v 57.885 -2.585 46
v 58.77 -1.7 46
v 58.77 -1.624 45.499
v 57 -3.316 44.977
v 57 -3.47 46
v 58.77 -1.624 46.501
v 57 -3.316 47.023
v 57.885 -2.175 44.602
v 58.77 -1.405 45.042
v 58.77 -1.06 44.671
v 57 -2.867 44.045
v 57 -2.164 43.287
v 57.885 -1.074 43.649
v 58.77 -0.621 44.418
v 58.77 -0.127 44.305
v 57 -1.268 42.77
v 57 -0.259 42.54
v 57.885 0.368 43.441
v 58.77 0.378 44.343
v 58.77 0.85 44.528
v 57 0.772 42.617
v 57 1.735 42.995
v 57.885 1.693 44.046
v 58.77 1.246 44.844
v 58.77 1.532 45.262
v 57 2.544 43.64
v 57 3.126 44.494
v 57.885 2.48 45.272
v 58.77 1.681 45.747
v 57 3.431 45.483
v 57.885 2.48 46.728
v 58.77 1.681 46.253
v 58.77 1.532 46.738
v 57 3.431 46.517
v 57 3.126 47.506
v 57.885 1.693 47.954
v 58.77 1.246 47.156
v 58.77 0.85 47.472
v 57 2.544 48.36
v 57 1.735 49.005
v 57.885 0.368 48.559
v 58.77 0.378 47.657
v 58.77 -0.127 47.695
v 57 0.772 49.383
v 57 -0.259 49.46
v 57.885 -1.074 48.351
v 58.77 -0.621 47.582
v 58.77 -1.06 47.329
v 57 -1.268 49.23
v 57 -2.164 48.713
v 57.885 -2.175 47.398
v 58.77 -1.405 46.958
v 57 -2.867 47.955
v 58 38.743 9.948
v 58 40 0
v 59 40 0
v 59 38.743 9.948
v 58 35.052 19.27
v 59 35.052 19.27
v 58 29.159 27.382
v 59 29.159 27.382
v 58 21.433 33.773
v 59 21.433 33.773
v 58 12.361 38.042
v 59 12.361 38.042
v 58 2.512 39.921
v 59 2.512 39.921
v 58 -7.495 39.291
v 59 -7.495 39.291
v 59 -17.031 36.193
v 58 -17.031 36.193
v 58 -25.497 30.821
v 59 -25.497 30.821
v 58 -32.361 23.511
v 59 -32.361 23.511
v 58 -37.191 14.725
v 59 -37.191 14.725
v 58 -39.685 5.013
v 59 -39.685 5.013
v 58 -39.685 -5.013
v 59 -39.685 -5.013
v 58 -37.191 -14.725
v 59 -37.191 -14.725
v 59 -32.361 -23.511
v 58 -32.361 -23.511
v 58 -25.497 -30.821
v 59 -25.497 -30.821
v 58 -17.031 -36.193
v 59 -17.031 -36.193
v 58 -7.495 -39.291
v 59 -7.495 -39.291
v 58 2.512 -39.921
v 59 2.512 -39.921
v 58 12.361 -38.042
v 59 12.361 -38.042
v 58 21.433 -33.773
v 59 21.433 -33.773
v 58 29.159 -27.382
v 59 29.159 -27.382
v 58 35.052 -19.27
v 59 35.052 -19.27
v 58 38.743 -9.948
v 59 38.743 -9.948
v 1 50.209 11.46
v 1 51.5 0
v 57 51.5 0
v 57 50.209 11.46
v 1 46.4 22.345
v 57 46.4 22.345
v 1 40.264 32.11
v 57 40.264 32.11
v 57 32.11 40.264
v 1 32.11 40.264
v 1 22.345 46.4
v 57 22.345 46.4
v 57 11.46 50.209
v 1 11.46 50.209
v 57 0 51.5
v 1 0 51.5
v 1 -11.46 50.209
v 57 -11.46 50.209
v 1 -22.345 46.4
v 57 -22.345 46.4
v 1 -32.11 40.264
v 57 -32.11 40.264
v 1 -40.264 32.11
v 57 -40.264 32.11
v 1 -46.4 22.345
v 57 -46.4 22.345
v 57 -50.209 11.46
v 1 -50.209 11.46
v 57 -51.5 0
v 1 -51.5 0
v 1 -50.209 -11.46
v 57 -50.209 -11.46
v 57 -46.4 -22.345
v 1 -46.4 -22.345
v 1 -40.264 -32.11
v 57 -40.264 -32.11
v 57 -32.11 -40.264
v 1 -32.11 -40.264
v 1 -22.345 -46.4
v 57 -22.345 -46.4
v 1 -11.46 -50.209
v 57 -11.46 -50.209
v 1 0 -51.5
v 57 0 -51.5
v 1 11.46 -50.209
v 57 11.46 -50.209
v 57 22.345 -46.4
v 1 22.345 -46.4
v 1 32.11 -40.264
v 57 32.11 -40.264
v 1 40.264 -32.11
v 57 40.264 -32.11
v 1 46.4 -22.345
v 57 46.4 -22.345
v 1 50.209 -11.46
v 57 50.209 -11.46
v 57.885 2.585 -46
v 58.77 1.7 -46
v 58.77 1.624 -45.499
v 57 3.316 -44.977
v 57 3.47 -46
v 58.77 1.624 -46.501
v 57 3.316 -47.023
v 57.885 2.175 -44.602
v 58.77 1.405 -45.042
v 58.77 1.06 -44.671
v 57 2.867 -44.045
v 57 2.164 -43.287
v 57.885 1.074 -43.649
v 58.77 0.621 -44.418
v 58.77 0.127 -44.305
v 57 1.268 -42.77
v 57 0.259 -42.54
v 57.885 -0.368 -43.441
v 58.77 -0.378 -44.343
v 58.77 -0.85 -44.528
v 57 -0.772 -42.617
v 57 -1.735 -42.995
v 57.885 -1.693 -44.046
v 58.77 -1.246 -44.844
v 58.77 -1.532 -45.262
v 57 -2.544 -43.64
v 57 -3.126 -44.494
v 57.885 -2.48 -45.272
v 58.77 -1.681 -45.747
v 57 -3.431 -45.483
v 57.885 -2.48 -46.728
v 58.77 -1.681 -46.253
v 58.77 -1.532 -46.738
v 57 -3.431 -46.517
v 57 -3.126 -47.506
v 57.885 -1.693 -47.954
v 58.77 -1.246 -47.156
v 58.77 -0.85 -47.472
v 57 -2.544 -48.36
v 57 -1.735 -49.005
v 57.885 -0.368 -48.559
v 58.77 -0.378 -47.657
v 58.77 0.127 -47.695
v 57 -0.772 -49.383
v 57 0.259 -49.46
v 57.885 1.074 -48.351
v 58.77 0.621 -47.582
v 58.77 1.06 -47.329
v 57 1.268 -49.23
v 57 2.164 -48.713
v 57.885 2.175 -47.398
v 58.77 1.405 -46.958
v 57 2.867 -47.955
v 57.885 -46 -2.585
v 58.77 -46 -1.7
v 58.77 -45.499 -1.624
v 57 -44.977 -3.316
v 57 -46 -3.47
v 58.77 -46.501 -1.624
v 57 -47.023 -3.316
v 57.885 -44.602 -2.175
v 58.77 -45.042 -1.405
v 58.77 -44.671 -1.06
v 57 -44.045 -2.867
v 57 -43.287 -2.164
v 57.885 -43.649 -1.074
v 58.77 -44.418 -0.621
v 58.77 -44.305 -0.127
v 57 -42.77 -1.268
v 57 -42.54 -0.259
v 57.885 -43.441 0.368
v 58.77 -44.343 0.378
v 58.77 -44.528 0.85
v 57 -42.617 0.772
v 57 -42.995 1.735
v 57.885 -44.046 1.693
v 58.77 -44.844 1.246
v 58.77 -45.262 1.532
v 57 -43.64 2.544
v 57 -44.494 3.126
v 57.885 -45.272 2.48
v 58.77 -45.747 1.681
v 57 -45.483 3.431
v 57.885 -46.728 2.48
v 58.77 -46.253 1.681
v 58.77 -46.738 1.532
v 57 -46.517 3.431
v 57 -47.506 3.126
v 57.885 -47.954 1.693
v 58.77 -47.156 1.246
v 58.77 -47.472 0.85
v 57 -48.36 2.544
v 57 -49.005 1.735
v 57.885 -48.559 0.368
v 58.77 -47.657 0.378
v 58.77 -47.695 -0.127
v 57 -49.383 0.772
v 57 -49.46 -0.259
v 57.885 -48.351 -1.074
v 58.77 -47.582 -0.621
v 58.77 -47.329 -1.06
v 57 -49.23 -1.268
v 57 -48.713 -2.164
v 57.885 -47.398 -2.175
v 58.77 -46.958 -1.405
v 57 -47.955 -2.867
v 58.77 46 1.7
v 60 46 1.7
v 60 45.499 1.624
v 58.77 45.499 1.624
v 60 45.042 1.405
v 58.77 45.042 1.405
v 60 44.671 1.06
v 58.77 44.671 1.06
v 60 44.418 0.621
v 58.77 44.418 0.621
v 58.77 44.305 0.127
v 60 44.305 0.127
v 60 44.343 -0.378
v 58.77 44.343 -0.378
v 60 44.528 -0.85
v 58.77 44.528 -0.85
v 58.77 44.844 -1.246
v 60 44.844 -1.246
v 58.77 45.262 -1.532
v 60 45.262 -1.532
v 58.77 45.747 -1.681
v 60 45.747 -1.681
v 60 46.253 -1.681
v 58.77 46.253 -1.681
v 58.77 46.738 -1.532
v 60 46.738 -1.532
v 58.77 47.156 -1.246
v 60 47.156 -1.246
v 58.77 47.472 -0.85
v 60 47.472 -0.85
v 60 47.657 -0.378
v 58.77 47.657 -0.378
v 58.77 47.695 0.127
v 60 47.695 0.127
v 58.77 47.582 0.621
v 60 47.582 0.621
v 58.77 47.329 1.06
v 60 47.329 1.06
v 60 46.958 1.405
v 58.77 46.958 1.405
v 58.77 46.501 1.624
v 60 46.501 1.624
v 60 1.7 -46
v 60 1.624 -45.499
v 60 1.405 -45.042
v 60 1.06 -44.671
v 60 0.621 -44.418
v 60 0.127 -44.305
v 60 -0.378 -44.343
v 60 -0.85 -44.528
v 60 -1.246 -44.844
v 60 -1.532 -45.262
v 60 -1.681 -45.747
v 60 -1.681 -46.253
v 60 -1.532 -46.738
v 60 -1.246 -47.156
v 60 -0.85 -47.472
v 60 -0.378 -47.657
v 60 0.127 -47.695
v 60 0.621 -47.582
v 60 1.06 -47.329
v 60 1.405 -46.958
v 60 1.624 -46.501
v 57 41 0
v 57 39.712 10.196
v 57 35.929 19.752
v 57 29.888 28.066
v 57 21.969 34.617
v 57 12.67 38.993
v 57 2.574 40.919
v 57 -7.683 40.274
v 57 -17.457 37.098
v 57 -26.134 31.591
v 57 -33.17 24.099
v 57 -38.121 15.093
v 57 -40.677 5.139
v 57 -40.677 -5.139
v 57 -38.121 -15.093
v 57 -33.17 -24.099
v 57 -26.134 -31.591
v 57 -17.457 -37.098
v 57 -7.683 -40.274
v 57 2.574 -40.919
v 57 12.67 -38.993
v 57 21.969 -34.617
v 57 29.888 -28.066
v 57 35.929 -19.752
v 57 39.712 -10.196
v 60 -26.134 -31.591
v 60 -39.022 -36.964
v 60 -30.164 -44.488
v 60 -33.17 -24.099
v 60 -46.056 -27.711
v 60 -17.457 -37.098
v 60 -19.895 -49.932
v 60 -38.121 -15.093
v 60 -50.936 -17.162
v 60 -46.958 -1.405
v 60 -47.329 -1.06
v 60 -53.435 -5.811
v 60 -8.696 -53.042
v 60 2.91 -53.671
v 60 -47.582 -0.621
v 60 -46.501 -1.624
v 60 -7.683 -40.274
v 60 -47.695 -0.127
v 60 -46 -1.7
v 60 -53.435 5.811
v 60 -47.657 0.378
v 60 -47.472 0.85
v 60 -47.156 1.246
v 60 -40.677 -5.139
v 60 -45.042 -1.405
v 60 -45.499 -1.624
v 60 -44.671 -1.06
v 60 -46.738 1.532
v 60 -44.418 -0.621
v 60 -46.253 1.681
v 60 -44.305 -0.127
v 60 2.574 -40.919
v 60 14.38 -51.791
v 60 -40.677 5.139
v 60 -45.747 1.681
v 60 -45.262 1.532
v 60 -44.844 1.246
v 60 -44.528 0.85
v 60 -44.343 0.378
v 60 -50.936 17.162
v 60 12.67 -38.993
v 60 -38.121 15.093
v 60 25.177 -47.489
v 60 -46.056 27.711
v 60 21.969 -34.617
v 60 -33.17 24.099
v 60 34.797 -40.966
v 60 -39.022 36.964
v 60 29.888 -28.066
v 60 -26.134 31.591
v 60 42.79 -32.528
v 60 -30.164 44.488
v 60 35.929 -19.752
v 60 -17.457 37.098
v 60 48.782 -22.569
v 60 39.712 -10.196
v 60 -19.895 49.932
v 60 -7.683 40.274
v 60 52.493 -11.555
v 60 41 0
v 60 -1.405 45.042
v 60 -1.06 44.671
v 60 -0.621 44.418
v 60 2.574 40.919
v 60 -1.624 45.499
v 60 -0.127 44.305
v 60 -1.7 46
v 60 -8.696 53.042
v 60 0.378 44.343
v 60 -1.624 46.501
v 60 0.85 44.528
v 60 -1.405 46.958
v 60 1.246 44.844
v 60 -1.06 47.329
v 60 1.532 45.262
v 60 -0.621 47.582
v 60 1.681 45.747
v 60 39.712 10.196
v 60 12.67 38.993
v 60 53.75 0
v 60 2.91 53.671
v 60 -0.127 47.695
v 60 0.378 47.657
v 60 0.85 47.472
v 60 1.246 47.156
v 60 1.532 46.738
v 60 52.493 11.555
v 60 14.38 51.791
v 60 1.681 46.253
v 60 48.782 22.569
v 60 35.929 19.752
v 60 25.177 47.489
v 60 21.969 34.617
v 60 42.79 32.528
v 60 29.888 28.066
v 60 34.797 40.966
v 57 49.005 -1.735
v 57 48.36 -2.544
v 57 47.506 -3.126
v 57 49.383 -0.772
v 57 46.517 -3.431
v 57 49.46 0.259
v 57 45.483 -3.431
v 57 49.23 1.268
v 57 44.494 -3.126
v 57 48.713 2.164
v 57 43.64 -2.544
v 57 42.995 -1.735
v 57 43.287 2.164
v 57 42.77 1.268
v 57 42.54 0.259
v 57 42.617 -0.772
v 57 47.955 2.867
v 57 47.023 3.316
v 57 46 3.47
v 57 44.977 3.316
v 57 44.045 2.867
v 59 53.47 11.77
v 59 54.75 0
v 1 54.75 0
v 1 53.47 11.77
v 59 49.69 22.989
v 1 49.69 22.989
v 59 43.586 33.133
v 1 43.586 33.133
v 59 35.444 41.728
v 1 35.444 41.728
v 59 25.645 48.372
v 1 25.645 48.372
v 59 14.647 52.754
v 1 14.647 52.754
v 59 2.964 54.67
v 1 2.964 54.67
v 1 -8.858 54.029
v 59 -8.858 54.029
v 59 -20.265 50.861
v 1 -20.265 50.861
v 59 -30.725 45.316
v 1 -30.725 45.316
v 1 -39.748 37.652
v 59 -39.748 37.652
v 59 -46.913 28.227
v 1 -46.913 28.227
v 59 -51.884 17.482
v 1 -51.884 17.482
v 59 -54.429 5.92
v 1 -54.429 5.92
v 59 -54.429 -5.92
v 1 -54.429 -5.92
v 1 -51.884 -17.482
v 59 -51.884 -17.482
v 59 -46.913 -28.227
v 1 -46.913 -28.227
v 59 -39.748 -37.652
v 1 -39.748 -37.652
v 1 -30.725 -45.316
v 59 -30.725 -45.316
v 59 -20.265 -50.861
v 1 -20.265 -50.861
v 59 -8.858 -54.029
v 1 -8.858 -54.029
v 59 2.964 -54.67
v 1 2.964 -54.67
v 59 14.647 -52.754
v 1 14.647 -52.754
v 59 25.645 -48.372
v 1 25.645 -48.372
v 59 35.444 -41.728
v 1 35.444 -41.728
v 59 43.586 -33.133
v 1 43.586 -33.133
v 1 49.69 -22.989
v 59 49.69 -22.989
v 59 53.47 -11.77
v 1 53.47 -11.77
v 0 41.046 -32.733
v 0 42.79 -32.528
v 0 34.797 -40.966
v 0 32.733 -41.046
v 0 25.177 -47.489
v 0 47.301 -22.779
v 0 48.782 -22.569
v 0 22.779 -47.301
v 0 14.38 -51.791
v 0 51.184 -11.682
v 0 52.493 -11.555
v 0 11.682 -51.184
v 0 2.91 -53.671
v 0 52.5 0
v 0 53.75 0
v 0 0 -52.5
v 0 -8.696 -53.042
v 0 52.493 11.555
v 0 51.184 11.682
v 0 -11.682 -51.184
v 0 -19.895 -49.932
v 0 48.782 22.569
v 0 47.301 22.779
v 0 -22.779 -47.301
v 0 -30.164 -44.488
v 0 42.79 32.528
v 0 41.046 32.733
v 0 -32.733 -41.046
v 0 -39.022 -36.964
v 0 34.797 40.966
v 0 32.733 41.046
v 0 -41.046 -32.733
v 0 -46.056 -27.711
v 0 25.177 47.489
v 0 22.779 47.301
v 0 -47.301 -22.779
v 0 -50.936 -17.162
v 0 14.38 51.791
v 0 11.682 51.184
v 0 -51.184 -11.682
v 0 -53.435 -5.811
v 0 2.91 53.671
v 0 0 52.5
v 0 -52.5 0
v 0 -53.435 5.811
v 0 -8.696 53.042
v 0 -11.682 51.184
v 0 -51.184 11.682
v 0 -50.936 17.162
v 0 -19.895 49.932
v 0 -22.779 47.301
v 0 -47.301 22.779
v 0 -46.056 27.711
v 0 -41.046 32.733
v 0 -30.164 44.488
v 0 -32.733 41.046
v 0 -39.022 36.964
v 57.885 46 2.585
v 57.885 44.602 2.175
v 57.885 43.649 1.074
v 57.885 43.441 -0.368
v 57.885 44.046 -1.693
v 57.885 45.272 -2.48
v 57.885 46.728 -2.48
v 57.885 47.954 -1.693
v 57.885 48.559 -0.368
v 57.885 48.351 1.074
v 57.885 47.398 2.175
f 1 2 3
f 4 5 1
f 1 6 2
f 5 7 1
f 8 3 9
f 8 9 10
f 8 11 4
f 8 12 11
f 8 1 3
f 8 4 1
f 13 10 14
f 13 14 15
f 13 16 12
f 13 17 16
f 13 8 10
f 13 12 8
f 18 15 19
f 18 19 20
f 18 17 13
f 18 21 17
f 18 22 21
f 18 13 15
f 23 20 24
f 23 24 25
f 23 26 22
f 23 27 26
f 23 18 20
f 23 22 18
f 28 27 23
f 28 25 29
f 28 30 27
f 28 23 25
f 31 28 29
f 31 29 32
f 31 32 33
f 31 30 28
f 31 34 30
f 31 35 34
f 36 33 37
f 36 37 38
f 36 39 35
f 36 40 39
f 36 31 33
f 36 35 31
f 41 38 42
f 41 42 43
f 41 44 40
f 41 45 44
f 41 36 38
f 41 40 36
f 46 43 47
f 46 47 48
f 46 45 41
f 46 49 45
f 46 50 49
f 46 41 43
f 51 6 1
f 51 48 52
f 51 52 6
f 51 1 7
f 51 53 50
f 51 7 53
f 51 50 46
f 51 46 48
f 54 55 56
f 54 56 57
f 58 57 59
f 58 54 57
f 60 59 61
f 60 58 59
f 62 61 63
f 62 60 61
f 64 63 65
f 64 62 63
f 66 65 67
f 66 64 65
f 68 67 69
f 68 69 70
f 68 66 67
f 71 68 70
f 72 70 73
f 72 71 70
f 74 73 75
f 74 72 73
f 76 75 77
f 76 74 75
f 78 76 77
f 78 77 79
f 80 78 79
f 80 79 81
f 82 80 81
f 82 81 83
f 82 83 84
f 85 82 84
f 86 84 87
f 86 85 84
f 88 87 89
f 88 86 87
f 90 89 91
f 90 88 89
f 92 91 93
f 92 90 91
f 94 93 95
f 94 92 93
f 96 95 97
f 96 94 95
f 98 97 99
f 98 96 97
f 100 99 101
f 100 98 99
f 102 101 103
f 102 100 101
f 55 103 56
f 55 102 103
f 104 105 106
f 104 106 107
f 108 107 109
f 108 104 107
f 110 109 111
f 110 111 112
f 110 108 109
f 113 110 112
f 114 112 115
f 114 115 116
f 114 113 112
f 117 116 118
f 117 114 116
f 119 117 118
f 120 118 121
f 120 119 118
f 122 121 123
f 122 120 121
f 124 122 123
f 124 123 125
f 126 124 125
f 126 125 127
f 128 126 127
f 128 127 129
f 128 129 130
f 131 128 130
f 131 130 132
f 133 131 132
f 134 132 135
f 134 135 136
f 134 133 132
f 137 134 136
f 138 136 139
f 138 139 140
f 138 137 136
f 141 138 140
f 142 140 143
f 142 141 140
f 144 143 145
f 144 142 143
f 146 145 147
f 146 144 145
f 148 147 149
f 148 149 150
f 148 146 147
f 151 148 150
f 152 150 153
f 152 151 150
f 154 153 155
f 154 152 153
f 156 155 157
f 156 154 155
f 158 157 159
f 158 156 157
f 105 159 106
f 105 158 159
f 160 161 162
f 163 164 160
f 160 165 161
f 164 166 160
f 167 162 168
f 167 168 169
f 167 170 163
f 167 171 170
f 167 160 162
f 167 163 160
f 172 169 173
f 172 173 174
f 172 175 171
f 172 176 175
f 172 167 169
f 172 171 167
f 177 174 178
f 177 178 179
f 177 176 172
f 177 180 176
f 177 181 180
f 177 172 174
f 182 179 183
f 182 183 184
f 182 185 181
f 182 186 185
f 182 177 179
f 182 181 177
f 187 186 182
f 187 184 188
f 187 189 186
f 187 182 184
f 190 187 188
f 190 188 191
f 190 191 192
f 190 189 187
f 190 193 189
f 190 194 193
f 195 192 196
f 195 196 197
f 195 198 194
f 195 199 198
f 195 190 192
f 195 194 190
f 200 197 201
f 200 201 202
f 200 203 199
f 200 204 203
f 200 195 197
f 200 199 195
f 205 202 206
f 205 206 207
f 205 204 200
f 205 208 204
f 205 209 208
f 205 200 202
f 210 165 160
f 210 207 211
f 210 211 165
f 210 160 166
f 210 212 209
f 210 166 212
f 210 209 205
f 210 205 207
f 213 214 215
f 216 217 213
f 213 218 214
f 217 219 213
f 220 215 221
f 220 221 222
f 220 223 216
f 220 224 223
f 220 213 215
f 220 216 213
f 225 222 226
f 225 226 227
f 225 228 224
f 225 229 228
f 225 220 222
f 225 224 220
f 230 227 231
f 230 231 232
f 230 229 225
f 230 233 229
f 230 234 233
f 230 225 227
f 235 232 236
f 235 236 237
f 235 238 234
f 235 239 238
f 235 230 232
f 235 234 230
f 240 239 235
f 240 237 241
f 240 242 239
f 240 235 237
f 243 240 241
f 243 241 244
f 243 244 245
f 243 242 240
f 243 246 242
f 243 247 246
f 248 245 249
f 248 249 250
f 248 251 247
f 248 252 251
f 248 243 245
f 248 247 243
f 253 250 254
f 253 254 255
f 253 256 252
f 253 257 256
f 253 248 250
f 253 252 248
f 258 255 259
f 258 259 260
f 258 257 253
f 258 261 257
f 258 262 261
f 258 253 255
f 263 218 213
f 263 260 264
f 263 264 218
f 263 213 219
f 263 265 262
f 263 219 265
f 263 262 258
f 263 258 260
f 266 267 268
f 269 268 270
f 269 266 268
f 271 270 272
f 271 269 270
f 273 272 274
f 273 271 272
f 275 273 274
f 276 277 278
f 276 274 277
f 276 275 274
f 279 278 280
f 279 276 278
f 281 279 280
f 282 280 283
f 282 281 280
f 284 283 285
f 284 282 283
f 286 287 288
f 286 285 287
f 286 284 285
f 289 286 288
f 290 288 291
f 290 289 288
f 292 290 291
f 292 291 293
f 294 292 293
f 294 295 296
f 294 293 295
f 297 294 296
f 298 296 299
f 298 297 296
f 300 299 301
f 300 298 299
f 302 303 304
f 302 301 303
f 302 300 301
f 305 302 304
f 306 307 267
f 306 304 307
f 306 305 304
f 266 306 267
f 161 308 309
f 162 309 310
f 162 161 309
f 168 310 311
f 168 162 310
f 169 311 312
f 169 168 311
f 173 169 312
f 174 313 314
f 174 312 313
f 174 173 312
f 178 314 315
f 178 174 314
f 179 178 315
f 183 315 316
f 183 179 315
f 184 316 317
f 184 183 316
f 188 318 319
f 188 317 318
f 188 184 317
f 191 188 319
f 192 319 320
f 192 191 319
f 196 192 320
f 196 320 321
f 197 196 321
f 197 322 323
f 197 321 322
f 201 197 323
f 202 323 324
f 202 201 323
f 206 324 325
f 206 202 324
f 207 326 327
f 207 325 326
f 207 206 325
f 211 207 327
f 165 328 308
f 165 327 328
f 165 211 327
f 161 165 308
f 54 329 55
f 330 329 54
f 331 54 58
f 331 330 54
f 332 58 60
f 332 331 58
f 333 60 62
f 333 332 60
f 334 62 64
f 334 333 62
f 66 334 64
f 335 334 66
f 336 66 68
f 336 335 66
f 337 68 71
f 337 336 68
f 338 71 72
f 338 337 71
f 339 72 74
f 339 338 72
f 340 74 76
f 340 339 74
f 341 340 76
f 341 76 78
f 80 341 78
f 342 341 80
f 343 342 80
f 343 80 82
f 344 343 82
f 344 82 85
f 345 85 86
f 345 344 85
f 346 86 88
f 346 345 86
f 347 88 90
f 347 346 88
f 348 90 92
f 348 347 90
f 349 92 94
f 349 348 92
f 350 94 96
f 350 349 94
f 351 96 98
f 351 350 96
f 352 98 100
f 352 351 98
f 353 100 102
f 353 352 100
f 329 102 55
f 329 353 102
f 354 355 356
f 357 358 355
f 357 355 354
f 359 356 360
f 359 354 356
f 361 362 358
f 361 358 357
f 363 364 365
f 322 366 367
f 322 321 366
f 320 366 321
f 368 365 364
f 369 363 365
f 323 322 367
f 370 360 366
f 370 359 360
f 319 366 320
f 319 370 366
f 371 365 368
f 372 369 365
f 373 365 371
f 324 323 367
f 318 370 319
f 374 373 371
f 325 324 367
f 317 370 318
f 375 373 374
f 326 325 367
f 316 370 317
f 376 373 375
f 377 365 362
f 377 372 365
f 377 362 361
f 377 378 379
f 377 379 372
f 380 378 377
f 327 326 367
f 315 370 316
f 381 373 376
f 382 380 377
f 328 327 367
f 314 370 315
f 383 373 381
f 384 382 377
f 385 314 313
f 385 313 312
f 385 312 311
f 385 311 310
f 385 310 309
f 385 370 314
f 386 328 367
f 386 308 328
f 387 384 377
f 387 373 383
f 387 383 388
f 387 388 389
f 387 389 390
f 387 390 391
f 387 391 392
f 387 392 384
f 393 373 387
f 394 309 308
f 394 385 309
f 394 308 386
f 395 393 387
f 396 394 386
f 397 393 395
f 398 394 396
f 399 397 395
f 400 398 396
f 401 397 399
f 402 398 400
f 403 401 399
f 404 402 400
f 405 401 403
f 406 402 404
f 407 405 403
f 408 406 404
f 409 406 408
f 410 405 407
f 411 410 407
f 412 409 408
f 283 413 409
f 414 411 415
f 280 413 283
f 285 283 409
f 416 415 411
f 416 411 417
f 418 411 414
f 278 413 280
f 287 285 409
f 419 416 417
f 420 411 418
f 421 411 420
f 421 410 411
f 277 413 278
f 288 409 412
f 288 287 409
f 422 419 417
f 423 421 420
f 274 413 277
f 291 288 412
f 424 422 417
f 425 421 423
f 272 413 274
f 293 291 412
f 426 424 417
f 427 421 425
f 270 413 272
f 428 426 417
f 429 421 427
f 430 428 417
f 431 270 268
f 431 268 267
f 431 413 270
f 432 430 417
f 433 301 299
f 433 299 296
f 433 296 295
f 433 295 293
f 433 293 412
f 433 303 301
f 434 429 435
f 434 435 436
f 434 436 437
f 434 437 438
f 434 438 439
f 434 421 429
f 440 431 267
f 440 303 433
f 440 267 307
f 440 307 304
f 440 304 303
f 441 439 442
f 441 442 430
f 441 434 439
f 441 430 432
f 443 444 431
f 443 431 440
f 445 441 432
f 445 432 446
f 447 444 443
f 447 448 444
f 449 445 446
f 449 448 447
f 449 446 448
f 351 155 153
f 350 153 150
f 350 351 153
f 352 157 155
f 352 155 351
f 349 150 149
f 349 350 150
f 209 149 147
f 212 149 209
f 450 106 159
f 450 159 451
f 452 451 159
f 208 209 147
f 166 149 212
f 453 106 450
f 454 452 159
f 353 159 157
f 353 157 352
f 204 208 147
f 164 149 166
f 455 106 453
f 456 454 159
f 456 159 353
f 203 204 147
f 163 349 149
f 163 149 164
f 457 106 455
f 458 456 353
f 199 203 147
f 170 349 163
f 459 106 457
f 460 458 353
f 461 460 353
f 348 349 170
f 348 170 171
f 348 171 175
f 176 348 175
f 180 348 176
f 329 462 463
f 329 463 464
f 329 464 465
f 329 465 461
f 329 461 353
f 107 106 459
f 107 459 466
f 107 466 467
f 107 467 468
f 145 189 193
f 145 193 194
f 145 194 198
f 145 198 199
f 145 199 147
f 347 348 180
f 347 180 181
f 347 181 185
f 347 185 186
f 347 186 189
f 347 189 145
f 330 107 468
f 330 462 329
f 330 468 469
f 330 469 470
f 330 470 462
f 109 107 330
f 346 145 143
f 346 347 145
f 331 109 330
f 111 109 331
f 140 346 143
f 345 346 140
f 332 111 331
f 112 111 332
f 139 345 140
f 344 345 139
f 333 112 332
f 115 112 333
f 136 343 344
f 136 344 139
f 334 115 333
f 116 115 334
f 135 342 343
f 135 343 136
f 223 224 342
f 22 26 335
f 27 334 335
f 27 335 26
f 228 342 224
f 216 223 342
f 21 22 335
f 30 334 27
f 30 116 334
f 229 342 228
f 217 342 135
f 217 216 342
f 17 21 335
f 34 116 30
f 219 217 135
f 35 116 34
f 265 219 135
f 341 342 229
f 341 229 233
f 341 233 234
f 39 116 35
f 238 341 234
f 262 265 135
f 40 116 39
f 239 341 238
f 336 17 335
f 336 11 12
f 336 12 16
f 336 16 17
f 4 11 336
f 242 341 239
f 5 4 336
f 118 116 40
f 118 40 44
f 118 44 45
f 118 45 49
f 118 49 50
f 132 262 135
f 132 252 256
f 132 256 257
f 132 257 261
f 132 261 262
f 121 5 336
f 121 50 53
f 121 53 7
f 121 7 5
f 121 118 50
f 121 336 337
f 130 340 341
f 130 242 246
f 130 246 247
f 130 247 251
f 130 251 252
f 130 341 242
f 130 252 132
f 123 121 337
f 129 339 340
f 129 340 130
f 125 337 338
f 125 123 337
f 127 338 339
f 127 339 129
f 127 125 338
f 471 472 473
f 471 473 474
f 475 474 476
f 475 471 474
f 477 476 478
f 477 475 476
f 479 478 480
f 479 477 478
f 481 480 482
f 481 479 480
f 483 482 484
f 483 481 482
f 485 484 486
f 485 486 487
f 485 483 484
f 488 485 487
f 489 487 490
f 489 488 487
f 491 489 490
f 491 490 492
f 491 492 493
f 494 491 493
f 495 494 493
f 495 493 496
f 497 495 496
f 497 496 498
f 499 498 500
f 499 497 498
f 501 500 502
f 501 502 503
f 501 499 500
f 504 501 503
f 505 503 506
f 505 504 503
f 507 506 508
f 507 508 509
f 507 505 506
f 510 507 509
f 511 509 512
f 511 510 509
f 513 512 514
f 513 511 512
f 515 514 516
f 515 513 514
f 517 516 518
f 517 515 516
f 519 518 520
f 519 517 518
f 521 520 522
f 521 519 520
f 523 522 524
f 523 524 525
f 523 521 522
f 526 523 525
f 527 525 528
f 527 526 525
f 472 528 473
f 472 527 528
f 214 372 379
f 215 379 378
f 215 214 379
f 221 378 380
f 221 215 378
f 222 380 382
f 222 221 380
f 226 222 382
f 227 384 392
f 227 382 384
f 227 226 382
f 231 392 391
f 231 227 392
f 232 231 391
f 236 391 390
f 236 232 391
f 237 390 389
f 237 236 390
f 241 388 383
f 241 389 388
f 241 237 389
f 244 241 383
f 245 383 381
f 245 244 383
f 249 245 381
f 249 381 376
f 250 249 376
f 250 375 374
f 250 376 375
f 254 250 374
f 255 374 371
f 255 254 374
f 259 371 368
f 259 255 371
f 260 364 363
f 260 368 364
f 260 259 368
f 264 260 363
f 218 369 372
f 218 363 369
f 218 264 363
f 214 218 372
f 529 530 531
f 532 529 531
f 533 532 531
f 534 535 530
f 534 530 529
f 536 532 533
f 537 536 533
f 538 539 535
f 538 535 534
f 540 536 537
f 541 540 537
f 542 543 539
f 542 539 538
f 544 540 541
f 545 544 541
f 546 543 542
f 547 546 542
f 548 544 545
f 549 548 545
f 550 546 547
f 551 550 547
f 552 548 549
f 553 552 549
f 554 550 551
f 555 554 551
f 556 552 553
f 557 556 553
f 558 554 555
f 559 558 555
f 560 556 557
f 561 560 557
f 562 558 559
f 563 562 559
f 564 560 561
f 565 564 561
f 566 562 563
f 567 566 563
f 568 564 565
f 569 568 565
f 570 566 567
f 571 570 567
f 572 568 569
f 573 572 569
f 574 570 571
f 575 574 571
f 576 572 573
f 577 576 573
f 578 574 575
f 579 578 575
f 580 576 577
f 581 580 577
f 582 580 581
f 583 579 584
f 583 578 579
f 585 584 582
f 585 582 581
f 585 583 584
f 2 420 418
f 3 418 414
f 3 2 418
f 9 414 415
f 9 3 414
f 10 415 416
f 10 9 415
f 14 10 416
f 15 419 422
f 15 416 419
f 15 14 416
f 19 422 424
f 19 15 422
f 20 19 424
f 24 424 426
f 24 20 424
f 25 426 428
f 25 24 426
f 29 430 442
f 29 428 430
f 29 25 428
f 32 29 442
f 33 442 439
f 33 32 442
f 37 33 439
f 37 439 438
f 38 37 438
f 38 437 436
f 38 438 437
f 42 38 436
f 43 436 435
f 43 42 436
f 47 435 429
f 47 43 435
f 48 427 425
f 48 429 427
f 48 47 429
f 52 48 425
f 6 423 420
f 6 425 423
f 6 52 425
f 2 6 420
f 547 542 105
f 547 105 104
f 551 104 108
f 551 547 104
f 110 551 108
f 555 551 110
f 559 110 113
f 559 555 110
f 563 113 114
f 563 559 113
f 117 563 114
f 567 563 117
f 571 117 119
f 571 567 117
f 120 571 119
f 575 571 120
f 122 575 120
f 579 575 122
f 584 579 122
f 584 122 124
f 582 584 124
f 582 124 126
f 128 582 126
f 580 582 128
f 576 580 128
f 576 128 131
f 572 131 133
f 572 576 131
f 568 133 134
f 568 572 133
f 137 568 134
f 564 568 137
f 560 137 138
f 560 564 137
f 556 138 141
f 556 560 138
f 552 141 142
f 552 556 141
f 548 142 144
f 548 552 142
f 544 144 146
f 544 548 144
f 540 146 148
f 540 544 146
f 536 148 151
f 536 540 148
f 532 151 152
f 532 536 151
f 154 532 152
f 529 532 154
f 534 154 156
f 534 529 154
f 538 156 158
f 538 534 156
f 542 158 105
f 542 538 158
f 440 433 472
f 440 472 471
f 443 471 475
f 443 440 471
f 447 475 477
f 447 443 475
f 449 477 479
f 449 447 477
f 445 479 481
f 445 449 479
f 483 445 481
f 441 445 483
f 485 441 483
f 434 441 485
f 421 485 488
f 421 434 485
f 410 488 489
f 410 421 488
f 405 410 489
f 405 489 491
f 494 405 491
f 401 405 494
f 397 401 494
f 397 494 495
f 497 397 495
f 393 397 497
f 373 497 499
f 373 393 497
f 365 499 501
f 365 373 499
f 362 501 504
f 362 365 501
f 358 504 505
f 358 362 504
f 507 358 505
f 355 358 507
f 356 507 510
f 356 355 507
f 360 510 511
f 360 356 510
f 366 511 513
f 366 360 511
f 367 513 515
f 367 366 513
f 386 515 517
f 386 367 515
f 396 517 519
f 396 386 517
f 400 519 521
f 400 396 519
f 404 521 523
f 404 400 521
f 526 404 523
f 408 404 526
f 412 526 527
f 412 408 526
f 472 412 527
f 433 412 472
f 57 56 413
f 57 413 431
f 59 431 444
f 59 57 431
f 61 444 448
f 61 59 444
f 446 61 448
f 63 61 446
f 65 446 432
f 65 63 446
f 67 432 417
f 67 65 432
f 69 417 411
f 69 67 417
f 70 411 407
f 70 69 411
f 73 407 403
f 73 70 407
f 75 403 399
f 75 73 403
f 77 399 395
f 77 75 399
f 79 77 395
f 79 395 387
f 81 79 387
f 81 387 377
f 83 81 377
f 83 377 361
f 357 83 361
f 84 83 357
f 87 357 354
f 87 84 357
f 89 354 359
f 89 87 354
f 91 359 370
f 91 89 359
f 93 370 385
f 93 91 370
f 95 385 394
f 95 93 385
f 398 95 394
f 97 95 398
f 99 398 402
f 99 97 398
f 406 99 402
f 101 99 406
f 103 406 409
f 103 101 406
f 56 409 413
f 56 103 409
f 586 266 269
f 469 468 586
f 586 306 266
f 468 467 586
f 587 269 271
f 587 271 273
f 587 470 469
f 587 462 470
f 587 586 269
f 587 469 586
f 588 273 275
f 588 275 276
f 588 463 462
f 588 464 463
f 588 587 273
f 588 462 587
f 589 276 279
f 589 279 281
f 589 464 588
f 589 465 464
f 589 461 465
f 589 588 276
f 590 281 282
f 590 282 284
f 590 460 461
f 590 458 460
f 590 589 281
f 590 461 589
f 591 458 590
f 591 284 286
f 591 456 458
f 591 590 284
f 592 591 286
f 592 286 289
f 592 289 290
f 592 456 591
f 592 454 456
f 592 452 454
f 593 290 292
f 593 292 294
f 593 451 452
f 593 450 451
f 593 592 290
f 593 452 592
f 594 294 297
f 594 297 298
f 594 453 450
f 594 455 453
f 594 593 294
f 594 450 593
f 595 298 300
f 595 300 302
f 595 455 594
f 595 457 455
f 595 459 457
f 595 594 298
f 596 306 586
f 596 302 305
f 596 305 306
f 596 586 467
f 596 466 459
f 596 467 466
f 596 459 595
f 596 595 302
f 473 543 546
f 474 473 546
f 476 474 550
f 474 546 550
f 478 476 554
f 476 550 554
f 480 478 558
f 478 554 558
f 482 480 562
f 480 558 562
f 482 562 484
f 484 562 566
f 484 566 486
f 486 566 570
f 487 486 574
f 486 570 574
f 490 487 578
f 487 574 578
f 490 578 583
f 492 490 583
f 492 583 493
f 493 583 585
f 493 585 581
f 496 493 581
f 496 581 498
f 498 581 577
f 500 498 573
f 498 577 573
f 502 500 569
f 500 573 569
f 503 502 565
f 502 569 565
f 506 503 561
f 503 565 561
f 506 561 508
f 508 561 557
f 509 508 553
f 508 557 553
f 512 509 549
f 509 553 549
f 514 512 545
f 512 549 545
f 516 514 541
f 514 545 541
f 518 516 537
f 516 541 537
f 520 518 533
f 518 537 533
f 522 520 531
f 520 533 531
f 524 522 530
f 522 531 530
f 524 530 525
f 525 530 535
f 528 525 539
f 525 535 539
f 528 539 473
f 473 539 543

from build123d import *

# Parameters (mm, degrees)
CHAMFER_1_SIZE           = 1
PATTERN_CIRCULAR_2_COUNT = 4


with BuildPart() as part:
    # Эскиз1 → Повернуть1 (revolve)
    with BuildSketch(Plane.XY):
        Polygon((0, 54.75), (60, 54.75), (60, 40), (57, 40), (57, 51.5), (0, 51.5), align=None)
    revolve(axis=Axis((0, 0, 0), (1, 0, 0)))

    # Фаска1
    chamfer_1_edges = [part.edges().sort_by_distance(p)[0] for p in [
        (0, -51.5, 0),
        (57, -40, 0),
        (60, -40, 0),
        (60, -54.75, 0),
        (0, -54.75, 0),
    ]]
    chamfer(chamfer_1_edges, length=CHAMFER_1_SIZE)

    # Эскиз5 → Зенковка для винта с потайной головкой и внутренним шестигранником M31 (revolve, cut)
    with BuildSketch(Plane(origin=(57, 46, 0), x_dir=(0, 0, 1), z_dir=(0, 1, 0))):
        Polygon((0, 0), (0, 22.5), (1.7, 21.478536948), (1.7, 1.77), (3.47, 0), align=None)
    hole_wizard_m31 = revolve(axis=Axis((50.65, 46, 0), (1, 0, 0)), mode=Mode.SUBTRACT)

    # Круговой массив2: Зенковка для винта с потайной головкой и внутренним шестигранником M31 ×4 about axis
    pattern_circular_2_axis = Axis((0, 0, 0), (1, 0, 0))
    for i in range(1, PATTERN_CIRCULAR_2_COUNT):
        add(hole_wizard_m31.rotate(pattern_circular_2_axis, i * 360 / PATTERN_CIRCULAR_2_COUNT), mode=Mode.SUBTRACT)


solid = part.part
